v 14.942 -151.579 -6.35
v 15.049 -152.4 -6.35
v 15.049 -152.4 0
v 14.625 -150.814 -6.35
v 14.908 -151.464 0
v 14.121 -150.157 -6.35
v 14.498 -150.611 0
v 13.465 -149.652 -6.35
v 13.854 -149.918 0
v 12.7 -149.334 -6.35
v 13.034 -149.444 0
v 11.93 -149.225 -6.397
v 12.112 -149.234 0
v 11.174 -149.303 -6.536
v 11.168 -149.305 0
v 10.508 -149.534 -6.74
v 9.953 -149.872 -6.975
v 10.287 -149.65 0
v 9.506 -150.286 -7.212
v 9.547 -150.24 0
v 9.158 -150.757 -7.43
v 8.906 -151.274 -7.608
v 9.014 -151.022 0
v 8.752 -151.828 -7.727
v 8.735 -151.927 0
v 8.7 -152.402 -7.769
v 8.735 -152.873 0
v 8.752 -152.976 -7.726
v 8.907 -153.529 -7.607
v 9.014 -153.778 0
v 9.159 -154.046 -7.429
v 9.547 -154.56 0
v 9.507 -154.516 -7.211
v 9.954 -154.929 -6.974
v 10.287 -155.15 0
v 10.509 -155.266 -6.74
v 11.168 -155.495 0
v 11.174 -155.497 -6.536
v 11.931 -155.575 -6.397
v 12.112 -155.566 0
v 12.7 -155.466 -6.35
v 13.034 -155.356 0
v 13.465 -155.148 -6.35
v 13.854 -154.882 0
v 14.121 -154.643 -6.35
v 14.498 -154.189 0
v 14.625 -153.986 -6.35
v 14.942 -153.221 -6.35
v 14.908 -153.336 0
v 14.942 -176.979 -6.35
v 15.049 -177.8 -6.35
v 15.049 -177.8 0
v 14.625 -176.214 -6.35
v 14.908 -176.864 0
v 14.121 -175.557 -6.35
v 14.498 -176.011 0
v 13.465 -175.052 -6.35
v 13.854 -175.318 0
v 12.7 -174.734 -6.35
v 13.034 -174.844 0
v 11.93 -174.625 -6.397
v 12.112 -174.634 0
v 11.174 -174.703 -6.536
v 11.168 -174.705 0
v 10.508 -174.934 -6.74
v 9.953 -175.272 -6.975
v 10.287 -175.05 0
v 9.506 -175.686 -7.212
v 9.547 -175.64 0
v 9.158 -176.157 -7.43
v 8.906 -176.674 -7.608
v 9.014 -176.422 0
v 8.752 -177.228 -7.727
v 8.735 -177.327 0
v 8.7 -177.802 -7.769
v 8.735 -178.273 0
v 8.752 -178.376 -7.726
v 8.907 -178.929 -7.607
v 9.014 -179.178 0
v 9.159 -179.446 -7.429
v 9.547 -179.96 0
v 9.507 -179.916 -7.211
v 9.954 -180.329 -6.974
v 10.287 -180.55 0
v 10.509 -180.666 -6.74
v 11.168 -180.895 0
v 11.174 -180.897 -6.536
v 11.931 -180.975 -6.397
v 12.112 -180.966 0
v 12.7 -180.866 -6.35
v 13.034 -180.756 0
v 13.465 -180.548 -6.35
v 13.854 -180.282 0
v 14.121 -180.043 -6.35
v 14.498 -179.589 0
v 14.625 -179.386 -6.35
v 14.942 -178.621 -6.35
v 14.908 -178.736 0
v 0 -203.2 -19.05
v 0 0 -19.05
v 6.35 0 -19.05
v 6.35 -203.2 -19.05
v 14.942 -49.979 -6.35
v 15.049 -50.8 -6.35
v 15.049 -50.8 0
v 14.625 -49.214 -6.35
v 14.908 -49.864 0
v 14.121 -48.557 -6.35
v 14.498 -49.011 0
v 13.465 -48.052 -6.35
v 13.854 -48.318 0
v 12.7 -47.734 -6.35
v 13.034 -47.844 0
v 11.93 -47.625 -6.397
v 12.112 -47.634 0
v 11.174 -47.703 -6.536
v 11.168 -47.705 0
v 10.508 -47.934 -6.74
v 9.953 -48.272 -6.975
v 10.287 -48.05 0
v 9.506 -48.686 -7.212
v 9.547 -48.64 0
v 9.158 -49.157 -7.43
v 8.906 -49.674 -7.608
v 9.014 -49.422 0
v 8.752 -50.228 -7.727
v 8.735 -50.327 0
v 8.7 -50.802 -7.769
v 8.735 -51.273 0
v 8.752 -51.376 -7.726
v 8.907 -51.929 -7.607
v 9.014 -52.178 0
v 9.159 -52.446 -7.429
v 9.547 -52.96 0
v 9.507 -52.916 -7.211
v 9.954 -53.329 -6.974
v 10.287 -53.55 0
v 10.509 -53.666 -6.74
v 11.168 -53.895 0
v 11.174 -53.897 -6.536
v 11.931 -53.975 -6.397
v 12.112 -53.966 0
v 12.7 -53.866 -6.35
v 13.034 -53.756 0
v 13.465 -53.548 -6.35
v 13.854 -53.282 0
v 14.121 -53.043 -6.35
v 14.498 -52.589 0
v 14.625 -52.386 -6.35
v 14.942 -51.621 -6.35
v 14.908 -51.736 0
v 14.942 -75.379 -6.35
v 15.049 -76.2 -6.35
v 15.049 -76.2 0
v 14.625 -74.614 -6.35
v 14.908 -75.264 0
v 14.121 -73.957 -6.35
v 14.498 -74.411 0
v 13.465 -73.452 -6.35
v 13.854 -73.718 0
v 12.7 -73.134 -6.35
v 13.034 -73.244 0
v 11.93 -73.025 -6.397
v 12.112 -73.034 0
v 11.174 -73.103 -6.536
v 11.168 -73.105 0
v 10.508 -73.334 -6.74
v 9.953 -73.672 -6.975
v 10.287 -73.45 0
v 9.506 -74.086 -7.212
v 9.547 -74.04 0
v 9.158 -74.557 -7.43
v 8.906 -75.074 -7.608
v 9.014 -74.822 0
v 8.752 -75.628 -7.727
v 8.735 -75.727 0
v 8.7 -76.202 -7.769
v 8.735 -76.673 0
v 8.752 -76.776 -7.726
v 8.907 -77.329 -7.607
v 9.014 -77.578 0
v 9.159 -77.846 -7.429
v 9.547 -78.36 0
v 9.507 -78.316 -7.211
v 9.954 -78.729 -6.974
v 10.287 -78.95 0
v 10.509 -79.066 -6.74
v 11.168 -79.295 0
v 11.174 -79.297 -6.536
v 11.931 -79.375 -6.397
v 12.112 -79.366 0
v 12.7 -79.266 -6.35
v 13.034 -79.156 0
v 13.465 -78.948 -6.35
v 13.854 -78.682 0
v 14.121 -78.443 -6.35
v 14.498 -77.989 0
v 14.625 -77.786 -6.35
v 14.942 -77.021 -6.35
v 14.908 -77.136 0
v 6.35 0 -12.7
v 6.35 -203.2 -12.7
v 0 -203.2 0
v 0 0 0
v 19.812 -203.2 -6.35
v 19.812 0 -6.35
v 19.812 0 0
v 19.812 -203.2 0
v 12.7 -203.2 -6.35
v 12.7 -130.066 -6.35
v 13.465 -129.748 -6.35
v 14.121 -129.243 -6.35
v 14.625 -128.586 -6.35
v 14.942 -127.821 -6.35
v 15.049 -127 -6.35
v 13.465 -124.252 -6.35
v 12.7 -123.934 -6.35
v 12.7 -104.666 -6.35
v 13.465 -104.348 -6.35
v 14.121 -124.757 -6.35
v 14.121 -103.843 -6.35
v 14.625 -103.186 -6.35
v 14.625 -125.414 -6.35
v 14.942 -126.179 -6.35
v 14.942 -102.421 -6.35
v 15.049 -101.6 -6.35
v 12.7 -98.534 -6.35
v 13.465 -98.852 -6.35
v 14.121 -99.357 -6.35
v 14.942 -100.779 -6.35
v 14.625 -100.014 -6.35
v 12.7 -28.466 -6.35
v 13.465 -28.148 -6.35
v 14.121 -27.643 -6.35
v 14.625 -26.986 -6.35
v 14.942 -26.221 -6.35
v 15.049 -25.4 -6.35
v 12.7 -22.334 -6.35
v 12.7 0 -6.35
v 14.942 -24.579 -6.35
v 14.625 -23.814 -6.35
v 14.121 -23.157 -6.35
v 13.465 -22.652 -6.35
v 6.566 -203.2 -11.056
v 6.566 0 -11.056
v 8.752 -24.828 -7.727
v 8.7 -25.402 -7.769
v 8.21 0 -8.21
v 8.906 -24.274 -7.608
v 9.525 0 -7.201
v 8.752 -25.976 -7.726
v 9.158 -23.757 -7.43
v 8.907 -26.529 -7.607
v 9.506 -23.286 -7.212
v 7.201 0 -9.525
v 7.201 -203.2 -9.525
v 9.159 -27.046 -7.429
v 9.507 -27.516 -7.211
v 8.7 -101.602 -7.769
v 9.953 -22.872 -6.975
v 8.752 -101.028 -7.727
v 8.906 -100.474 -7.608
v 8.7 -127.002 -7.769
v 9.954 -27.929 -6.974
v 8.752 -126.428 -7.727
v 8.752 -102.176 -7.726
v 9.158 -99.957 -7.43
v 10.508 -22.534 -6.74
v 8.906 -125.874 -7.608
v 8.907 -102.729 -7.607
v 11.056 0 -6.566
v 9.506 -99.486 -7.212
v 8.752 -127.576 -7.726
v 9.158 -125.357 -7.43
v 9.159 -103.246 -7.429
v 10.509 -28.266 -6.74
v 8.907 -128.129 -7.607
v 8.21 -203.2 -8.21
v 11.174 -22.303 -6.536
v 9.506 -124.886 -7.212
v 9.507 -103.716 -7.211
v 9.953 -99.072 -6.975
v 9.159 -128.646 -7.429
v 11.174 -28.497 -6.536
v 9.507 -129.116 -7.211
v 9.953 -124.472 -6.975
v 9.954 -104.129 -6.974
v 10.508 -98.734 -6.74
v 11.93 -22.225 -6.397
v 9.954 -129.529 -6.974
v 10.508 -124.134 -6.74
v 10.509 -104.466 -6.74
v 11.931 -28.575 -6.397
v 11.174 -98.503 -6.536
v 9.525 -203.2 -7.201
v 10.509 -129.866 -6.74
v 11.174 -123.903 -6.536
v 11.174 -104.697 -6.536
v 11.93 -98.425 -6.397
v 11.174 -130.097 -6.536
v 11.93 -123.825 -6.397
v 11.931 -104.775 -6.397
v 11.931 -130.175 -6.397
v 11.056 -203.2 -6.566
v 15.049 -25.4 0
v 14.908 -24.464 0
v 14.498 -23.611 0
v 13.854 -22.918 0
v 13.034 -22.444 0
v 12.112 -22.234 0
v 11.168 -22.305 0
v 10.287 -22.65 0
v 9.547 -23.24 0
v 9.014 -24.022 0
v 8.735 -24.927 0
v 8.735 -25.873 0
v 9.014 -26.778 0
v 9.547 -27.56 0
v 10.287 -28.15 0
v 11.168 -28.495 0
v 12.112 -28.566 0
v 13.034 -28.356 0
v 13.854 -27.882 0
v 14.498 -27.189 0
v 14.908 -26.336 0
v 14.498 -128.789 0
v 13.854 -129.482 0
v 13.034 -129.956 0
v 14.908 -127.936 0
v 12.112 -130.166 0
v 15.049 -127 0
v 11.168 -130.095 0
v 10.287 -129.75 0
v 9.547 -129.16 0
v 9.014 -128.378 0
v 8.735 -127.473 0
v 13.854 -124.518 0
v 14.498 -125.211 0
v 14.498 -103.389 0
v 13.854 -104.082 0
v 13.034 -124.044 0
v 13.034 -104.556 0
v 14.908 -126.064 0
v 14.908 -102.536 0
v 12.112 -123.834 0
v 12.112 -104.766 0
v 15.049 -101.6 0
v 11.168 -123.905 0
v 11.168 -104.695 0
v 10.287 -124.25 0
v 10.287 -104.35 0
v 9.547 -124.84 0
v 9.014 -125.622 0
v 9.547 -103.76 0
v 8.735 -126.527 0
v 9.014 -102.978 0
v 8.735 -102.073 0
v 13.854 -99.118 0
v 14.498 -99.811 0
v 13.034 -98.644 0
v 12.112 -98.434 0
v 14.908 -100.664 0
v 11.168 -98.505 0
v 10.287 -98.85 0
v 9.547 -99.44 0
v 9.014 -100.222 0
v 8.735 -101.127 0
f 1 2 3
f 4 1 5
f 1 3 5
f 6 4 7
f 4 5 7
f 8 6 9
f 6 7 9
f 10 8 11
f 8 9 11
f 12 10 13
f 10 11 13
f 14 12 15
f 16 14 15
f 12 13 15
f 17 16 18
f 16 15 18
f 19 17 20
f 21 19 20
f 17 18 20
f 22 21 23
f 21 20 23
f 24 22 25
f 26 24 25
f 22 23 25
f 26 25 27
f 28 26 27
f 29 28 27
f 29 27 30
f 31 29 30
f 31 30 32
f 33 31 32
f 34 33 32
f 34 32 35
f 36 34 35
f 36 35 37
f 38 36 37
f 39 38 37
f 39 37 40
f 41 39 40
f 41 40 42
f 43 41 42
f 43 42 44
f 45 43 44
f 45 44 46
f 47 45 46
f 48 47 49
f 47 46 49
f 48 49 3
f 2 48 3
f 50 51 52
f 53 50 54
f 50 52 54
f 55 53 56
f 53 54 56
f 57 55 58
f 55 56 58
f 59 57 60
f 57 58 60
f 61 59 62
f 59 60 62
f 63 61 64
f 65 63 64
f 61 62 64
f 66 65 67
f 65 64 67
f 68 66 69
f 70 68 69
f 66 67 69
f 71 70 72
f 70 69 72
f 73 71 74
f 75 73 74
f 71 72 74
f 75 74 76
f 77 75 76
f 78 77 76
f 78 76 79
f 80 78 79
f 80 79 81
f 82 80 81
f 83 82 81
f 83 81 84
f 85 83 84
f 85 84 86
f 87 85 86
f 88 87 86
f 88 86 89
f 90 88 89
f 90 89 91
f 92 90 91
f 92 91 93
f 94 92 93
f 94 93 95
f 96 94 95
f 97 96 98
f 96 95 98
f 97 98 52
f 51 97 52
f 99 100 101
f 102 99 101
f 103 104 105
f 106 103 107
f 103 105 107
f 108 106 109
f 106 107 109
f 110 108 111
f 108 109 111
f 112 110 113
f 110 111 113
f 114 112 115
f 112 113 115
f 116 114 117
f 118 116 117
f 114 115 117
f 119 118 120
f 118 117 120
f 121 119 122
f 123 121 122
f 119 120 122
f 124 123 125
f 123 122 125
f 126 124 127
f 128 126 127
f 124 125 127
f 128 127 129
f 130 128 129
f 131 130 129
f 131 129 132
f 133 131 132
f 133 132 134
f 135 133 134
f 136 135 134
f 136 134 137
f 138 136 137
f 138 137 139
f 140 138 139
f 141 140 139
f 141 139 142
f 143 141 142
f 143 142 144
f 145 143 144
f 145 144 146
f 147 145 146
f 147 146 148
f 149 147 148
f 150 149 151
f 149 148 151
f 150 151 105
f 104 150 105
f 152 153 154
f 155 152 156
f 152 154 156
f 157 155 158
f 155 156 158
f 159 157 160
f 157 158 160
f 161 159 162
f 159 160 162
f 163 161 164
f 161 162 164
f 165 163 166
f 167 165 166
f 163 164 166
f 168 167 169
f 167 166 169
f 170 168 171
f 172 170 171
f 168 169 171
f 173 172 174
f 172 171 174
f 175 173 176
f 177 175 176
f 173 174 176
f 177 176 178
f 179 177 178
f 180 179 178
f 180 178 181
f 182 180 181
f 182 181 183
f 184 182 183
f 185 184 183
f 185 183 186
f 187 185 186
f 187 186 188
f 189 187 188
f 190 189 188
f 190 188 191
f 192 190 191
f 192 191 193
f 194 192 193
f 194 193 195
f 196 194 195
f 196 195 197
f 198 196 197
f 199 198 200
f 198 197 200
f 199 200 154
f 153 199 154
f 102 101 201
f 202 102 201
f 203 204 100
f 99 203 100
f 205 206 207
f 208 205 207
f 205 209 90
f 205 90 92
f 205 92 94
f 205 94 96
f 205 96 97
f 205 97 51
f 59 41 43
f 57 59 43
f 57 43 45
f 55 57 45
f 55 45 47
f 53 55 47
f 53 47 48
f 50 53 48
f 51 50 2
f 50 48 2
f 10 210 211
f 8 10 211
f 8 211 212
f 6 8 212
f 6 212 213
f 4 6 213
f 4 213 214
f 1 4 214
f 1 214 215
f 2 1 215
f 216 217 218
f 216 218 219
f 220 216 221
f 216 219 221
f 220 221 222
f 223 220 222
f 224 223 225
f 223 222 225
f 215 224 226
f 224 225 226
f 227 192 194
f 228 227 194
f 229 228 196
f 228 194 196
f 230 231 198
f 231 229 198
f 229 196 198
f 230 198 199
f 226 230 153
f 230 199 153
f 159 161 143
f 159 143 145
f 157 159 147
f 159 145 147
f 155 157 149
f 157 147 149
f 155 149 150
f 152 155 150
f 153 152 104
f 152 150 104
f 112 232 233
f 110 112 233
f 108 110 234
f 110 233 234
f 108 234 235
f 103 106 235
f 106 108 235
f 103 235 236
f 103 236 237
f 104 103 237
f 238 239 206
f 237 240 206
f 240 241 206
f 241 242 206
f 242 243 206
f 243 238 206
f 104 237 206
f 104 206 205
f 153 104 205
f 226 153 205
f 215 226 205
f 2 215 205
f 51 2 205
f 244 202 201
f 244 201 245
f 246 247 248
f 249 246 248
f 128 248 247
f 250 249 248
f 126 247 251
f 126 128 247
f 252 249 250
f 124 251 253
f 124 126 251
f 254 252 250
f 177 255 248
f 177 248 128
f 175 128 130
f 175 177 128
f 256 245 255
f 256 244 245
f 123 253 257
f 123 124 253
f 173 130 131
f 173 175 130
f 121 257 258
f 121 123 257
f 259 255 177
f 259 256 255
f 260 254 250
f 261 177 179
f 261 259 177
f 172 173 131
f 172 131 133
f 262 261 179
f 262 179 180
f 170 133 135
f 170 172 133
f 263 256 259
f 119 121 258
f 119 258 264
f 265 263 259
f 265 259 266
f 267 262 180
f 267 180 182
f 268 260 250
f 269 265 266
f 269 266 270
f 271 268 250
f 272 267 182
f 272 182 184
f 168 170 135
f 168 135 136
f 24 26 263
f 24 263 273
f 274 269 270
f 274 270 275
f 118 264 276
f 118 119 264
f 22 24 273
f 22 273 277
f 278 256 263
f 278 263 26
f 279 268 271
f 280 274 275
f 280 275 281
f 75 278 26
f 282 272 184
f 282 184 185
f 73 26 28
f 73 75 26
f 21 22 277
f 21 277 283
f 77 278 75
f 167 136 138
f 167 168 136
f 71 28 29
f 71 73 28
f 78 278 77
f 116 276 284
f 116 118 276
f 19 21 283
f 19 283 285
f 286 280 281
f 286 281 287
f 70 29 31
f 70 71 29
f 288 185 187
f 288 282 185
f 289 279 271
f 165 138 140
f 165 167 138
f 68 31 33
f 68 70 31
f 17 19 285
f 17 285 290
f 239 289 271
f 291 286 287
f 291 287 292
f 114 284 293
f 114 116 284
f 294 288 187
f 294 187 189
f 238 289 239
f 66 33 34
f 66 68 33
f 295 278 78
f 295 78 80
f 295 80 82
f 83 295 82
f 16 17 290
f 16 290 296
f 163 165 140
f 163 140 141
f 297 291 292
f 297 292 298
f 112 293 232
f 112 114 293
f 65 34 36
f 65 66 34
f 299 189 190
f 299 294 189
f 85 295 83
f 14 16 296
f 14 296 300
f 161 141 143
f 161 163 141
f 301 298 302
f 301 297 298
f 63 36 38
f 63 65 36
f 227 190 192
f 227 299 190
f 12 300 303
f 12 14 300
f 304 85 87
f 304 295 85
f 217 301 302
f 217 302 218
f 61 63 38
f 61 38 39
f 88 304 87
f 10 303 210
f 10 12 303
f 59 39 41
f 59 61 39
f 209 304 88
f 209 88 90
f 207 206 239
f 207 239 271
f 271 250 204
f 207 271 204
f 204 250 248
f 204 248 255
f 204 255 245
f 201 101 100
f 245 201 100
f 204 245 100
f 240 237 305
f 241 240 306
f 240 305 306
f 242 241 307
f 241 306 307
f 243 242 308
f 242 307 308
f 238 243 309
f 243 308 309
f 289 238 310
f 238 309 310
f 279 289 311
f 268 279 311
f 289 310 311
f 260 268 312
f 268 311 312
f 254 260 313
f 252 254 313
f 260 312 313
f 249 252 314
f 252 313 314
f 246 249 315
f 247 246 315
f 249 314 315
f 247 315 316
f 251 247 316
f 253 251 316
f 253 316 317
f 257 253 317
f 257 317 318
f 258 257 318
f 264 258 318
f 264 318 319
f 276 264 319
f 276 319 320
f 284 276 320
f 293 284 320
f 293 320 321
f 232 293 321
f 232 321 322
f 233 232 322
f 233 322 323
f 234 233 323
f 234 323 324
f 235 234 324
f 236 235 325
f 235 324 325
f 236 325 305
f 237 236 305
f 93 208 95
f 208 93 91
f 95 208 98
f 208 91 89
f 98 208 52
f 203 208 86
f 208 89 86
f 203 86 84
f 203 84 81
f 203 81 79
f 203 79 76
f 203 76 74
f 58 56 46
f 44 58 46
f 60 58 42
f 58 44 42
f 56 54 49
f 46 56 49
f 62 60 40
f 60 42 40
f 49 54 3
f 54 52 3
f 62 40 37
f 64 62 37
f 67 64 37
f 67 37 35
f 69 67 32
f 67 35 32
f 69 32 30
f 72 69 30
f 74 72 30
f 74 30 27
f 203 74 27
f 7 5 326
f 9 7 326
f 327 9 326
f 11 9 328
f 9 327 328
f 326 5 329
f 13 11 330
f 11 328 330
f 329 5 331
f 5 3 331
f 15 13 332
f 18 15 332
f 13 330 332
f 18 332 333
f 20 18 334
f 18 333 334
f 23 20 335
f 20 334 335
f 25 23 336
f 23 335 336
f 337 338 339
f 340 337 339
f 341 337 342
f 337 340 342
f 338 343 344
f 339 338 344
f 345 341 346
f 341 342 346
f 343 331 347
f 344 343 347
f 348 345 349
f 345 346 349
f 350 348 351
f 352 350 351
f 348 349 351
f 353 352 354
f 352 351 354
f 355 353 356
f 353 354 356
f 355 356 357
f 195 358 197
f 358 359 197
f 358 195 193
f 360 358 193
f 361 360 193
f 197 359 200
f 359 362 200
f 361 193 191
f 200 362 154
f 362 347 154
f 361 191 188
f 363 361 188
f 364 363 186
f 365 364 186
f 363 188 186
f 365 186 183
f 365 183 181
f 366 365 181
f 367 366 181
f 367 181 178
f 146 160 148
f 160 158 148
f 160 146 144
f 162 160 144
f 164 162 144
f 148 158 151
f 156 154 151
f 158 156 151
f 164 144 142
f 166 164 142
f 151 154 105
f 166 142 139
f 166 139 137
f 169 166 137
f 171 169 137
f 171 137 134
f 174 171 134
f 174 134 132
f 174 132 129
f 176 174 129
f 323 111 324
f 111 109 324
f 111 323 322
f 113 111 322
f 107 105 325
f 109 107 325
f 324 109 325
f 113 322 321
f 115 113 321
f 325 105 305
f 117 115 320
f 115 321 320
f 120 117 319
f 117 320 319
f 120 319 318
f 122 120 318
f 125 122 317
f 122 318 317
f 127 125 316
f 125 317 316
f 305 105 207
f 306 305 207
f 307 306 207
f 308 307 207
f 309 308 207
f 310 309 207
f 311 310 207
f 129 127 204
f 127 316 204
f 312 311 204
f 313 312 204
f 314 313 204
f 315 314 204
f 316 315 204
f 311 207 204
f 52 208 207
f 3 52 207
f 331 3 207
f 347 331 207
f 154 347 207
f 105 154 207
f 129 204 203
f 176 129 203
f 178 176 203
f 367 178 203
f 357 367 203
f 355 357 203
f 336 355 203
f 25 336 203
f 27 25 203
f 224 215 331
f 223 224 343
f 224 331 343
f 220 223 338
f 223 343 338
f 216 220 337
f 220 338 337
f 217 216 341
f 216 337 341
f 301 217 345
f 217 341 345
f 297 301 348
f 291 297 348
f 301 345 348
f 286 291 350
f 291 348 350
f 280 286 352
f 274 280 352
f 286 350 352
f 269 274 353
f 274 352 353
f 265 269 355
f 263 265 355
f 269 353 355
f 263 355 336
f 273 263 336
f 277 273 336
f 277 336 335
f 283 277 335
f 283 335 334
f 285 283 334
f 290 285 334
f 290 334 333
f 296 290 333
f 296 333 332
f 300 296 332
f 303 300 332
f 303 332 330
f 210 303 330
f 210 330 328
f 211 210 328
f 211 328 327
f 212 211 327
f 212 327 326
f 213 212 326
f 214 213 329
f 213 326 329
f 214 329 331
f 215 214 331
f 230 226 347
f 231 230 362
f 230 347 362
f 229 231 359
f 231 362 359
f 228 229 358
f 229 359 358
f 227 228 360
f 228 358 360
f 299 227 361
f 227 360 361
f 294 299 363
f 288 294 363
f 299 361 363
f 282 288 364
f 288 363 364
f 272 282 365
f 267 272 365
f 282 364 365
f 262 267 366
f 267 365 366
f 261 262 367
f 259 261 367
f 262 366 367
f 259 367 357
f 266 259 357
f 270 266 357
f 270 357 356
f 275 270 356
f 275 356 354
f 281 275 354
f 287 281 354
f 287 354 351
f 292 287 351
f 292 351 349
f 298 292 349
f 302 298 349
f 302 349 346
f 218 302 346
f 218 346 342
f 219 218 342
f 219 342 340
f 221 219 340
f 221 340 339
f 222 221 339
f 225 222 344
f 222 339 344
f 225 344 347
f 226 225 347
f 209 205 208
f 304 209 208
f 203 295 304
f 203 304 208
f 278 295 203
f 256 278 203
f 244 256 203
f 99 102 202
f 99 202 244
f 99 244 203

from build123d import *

# Parameters (mm, degrees)
BOSS_EXTRUDE1_DEPTH = 203.2
FILLET1_R           = 6.35
SKETCH2_R           = 3.175
CUT_EXTRUDE1_DEPTH  = 206.050378795
LPATTERN1_COUNT     = 7
LPATTERN1_PITCH     = 25.4


with BuildPart() as part:
    # Sketch1 → Boss-Extrude1 (new body)
    with BuildSketch(Plane(origin=(0, 0, 0), x_dir=(1, 0, 0), z_dir=(0, 1, 0))):
        Polygon((0, 0), (0, 19.05), (6.35, 19.05), (6.35, 6.35), (19.812, 6.35), (19.812, 0), align=None)
    extrude(amount=-BOSS_EXTRUDE1_DEPTH)

    # Fillet1
    fillet1_edges = [part.edges().sort_by_distance(p)[0] for p in [
        (6.35, -101.6, -6.35),
    ]]
    fillet(fillet1_edges, radius=FILLET1_R)

    # Sketch2 → Cut-Extrude1 (cut, through all)
    with BuildSketch(Plane.XY):
        with Locations((11.8745, -25.4)):
            Circle(SKETCH2_R)
    cut_extrude1 = extrude(amount=-CUT_EXTRUDE1_DEPTH, mode=Mode.SUBTRACT)

    # LPattern1: Cut-Extrude1 ×7
    with Locations(*[(0, -i * LPATTERN1_PITCH, 0) for i in range(1, LPATTERN1_COUNT)]):
        add(cut_extrude1, mode=Mode.SUBTRACT)


solid = part.part
